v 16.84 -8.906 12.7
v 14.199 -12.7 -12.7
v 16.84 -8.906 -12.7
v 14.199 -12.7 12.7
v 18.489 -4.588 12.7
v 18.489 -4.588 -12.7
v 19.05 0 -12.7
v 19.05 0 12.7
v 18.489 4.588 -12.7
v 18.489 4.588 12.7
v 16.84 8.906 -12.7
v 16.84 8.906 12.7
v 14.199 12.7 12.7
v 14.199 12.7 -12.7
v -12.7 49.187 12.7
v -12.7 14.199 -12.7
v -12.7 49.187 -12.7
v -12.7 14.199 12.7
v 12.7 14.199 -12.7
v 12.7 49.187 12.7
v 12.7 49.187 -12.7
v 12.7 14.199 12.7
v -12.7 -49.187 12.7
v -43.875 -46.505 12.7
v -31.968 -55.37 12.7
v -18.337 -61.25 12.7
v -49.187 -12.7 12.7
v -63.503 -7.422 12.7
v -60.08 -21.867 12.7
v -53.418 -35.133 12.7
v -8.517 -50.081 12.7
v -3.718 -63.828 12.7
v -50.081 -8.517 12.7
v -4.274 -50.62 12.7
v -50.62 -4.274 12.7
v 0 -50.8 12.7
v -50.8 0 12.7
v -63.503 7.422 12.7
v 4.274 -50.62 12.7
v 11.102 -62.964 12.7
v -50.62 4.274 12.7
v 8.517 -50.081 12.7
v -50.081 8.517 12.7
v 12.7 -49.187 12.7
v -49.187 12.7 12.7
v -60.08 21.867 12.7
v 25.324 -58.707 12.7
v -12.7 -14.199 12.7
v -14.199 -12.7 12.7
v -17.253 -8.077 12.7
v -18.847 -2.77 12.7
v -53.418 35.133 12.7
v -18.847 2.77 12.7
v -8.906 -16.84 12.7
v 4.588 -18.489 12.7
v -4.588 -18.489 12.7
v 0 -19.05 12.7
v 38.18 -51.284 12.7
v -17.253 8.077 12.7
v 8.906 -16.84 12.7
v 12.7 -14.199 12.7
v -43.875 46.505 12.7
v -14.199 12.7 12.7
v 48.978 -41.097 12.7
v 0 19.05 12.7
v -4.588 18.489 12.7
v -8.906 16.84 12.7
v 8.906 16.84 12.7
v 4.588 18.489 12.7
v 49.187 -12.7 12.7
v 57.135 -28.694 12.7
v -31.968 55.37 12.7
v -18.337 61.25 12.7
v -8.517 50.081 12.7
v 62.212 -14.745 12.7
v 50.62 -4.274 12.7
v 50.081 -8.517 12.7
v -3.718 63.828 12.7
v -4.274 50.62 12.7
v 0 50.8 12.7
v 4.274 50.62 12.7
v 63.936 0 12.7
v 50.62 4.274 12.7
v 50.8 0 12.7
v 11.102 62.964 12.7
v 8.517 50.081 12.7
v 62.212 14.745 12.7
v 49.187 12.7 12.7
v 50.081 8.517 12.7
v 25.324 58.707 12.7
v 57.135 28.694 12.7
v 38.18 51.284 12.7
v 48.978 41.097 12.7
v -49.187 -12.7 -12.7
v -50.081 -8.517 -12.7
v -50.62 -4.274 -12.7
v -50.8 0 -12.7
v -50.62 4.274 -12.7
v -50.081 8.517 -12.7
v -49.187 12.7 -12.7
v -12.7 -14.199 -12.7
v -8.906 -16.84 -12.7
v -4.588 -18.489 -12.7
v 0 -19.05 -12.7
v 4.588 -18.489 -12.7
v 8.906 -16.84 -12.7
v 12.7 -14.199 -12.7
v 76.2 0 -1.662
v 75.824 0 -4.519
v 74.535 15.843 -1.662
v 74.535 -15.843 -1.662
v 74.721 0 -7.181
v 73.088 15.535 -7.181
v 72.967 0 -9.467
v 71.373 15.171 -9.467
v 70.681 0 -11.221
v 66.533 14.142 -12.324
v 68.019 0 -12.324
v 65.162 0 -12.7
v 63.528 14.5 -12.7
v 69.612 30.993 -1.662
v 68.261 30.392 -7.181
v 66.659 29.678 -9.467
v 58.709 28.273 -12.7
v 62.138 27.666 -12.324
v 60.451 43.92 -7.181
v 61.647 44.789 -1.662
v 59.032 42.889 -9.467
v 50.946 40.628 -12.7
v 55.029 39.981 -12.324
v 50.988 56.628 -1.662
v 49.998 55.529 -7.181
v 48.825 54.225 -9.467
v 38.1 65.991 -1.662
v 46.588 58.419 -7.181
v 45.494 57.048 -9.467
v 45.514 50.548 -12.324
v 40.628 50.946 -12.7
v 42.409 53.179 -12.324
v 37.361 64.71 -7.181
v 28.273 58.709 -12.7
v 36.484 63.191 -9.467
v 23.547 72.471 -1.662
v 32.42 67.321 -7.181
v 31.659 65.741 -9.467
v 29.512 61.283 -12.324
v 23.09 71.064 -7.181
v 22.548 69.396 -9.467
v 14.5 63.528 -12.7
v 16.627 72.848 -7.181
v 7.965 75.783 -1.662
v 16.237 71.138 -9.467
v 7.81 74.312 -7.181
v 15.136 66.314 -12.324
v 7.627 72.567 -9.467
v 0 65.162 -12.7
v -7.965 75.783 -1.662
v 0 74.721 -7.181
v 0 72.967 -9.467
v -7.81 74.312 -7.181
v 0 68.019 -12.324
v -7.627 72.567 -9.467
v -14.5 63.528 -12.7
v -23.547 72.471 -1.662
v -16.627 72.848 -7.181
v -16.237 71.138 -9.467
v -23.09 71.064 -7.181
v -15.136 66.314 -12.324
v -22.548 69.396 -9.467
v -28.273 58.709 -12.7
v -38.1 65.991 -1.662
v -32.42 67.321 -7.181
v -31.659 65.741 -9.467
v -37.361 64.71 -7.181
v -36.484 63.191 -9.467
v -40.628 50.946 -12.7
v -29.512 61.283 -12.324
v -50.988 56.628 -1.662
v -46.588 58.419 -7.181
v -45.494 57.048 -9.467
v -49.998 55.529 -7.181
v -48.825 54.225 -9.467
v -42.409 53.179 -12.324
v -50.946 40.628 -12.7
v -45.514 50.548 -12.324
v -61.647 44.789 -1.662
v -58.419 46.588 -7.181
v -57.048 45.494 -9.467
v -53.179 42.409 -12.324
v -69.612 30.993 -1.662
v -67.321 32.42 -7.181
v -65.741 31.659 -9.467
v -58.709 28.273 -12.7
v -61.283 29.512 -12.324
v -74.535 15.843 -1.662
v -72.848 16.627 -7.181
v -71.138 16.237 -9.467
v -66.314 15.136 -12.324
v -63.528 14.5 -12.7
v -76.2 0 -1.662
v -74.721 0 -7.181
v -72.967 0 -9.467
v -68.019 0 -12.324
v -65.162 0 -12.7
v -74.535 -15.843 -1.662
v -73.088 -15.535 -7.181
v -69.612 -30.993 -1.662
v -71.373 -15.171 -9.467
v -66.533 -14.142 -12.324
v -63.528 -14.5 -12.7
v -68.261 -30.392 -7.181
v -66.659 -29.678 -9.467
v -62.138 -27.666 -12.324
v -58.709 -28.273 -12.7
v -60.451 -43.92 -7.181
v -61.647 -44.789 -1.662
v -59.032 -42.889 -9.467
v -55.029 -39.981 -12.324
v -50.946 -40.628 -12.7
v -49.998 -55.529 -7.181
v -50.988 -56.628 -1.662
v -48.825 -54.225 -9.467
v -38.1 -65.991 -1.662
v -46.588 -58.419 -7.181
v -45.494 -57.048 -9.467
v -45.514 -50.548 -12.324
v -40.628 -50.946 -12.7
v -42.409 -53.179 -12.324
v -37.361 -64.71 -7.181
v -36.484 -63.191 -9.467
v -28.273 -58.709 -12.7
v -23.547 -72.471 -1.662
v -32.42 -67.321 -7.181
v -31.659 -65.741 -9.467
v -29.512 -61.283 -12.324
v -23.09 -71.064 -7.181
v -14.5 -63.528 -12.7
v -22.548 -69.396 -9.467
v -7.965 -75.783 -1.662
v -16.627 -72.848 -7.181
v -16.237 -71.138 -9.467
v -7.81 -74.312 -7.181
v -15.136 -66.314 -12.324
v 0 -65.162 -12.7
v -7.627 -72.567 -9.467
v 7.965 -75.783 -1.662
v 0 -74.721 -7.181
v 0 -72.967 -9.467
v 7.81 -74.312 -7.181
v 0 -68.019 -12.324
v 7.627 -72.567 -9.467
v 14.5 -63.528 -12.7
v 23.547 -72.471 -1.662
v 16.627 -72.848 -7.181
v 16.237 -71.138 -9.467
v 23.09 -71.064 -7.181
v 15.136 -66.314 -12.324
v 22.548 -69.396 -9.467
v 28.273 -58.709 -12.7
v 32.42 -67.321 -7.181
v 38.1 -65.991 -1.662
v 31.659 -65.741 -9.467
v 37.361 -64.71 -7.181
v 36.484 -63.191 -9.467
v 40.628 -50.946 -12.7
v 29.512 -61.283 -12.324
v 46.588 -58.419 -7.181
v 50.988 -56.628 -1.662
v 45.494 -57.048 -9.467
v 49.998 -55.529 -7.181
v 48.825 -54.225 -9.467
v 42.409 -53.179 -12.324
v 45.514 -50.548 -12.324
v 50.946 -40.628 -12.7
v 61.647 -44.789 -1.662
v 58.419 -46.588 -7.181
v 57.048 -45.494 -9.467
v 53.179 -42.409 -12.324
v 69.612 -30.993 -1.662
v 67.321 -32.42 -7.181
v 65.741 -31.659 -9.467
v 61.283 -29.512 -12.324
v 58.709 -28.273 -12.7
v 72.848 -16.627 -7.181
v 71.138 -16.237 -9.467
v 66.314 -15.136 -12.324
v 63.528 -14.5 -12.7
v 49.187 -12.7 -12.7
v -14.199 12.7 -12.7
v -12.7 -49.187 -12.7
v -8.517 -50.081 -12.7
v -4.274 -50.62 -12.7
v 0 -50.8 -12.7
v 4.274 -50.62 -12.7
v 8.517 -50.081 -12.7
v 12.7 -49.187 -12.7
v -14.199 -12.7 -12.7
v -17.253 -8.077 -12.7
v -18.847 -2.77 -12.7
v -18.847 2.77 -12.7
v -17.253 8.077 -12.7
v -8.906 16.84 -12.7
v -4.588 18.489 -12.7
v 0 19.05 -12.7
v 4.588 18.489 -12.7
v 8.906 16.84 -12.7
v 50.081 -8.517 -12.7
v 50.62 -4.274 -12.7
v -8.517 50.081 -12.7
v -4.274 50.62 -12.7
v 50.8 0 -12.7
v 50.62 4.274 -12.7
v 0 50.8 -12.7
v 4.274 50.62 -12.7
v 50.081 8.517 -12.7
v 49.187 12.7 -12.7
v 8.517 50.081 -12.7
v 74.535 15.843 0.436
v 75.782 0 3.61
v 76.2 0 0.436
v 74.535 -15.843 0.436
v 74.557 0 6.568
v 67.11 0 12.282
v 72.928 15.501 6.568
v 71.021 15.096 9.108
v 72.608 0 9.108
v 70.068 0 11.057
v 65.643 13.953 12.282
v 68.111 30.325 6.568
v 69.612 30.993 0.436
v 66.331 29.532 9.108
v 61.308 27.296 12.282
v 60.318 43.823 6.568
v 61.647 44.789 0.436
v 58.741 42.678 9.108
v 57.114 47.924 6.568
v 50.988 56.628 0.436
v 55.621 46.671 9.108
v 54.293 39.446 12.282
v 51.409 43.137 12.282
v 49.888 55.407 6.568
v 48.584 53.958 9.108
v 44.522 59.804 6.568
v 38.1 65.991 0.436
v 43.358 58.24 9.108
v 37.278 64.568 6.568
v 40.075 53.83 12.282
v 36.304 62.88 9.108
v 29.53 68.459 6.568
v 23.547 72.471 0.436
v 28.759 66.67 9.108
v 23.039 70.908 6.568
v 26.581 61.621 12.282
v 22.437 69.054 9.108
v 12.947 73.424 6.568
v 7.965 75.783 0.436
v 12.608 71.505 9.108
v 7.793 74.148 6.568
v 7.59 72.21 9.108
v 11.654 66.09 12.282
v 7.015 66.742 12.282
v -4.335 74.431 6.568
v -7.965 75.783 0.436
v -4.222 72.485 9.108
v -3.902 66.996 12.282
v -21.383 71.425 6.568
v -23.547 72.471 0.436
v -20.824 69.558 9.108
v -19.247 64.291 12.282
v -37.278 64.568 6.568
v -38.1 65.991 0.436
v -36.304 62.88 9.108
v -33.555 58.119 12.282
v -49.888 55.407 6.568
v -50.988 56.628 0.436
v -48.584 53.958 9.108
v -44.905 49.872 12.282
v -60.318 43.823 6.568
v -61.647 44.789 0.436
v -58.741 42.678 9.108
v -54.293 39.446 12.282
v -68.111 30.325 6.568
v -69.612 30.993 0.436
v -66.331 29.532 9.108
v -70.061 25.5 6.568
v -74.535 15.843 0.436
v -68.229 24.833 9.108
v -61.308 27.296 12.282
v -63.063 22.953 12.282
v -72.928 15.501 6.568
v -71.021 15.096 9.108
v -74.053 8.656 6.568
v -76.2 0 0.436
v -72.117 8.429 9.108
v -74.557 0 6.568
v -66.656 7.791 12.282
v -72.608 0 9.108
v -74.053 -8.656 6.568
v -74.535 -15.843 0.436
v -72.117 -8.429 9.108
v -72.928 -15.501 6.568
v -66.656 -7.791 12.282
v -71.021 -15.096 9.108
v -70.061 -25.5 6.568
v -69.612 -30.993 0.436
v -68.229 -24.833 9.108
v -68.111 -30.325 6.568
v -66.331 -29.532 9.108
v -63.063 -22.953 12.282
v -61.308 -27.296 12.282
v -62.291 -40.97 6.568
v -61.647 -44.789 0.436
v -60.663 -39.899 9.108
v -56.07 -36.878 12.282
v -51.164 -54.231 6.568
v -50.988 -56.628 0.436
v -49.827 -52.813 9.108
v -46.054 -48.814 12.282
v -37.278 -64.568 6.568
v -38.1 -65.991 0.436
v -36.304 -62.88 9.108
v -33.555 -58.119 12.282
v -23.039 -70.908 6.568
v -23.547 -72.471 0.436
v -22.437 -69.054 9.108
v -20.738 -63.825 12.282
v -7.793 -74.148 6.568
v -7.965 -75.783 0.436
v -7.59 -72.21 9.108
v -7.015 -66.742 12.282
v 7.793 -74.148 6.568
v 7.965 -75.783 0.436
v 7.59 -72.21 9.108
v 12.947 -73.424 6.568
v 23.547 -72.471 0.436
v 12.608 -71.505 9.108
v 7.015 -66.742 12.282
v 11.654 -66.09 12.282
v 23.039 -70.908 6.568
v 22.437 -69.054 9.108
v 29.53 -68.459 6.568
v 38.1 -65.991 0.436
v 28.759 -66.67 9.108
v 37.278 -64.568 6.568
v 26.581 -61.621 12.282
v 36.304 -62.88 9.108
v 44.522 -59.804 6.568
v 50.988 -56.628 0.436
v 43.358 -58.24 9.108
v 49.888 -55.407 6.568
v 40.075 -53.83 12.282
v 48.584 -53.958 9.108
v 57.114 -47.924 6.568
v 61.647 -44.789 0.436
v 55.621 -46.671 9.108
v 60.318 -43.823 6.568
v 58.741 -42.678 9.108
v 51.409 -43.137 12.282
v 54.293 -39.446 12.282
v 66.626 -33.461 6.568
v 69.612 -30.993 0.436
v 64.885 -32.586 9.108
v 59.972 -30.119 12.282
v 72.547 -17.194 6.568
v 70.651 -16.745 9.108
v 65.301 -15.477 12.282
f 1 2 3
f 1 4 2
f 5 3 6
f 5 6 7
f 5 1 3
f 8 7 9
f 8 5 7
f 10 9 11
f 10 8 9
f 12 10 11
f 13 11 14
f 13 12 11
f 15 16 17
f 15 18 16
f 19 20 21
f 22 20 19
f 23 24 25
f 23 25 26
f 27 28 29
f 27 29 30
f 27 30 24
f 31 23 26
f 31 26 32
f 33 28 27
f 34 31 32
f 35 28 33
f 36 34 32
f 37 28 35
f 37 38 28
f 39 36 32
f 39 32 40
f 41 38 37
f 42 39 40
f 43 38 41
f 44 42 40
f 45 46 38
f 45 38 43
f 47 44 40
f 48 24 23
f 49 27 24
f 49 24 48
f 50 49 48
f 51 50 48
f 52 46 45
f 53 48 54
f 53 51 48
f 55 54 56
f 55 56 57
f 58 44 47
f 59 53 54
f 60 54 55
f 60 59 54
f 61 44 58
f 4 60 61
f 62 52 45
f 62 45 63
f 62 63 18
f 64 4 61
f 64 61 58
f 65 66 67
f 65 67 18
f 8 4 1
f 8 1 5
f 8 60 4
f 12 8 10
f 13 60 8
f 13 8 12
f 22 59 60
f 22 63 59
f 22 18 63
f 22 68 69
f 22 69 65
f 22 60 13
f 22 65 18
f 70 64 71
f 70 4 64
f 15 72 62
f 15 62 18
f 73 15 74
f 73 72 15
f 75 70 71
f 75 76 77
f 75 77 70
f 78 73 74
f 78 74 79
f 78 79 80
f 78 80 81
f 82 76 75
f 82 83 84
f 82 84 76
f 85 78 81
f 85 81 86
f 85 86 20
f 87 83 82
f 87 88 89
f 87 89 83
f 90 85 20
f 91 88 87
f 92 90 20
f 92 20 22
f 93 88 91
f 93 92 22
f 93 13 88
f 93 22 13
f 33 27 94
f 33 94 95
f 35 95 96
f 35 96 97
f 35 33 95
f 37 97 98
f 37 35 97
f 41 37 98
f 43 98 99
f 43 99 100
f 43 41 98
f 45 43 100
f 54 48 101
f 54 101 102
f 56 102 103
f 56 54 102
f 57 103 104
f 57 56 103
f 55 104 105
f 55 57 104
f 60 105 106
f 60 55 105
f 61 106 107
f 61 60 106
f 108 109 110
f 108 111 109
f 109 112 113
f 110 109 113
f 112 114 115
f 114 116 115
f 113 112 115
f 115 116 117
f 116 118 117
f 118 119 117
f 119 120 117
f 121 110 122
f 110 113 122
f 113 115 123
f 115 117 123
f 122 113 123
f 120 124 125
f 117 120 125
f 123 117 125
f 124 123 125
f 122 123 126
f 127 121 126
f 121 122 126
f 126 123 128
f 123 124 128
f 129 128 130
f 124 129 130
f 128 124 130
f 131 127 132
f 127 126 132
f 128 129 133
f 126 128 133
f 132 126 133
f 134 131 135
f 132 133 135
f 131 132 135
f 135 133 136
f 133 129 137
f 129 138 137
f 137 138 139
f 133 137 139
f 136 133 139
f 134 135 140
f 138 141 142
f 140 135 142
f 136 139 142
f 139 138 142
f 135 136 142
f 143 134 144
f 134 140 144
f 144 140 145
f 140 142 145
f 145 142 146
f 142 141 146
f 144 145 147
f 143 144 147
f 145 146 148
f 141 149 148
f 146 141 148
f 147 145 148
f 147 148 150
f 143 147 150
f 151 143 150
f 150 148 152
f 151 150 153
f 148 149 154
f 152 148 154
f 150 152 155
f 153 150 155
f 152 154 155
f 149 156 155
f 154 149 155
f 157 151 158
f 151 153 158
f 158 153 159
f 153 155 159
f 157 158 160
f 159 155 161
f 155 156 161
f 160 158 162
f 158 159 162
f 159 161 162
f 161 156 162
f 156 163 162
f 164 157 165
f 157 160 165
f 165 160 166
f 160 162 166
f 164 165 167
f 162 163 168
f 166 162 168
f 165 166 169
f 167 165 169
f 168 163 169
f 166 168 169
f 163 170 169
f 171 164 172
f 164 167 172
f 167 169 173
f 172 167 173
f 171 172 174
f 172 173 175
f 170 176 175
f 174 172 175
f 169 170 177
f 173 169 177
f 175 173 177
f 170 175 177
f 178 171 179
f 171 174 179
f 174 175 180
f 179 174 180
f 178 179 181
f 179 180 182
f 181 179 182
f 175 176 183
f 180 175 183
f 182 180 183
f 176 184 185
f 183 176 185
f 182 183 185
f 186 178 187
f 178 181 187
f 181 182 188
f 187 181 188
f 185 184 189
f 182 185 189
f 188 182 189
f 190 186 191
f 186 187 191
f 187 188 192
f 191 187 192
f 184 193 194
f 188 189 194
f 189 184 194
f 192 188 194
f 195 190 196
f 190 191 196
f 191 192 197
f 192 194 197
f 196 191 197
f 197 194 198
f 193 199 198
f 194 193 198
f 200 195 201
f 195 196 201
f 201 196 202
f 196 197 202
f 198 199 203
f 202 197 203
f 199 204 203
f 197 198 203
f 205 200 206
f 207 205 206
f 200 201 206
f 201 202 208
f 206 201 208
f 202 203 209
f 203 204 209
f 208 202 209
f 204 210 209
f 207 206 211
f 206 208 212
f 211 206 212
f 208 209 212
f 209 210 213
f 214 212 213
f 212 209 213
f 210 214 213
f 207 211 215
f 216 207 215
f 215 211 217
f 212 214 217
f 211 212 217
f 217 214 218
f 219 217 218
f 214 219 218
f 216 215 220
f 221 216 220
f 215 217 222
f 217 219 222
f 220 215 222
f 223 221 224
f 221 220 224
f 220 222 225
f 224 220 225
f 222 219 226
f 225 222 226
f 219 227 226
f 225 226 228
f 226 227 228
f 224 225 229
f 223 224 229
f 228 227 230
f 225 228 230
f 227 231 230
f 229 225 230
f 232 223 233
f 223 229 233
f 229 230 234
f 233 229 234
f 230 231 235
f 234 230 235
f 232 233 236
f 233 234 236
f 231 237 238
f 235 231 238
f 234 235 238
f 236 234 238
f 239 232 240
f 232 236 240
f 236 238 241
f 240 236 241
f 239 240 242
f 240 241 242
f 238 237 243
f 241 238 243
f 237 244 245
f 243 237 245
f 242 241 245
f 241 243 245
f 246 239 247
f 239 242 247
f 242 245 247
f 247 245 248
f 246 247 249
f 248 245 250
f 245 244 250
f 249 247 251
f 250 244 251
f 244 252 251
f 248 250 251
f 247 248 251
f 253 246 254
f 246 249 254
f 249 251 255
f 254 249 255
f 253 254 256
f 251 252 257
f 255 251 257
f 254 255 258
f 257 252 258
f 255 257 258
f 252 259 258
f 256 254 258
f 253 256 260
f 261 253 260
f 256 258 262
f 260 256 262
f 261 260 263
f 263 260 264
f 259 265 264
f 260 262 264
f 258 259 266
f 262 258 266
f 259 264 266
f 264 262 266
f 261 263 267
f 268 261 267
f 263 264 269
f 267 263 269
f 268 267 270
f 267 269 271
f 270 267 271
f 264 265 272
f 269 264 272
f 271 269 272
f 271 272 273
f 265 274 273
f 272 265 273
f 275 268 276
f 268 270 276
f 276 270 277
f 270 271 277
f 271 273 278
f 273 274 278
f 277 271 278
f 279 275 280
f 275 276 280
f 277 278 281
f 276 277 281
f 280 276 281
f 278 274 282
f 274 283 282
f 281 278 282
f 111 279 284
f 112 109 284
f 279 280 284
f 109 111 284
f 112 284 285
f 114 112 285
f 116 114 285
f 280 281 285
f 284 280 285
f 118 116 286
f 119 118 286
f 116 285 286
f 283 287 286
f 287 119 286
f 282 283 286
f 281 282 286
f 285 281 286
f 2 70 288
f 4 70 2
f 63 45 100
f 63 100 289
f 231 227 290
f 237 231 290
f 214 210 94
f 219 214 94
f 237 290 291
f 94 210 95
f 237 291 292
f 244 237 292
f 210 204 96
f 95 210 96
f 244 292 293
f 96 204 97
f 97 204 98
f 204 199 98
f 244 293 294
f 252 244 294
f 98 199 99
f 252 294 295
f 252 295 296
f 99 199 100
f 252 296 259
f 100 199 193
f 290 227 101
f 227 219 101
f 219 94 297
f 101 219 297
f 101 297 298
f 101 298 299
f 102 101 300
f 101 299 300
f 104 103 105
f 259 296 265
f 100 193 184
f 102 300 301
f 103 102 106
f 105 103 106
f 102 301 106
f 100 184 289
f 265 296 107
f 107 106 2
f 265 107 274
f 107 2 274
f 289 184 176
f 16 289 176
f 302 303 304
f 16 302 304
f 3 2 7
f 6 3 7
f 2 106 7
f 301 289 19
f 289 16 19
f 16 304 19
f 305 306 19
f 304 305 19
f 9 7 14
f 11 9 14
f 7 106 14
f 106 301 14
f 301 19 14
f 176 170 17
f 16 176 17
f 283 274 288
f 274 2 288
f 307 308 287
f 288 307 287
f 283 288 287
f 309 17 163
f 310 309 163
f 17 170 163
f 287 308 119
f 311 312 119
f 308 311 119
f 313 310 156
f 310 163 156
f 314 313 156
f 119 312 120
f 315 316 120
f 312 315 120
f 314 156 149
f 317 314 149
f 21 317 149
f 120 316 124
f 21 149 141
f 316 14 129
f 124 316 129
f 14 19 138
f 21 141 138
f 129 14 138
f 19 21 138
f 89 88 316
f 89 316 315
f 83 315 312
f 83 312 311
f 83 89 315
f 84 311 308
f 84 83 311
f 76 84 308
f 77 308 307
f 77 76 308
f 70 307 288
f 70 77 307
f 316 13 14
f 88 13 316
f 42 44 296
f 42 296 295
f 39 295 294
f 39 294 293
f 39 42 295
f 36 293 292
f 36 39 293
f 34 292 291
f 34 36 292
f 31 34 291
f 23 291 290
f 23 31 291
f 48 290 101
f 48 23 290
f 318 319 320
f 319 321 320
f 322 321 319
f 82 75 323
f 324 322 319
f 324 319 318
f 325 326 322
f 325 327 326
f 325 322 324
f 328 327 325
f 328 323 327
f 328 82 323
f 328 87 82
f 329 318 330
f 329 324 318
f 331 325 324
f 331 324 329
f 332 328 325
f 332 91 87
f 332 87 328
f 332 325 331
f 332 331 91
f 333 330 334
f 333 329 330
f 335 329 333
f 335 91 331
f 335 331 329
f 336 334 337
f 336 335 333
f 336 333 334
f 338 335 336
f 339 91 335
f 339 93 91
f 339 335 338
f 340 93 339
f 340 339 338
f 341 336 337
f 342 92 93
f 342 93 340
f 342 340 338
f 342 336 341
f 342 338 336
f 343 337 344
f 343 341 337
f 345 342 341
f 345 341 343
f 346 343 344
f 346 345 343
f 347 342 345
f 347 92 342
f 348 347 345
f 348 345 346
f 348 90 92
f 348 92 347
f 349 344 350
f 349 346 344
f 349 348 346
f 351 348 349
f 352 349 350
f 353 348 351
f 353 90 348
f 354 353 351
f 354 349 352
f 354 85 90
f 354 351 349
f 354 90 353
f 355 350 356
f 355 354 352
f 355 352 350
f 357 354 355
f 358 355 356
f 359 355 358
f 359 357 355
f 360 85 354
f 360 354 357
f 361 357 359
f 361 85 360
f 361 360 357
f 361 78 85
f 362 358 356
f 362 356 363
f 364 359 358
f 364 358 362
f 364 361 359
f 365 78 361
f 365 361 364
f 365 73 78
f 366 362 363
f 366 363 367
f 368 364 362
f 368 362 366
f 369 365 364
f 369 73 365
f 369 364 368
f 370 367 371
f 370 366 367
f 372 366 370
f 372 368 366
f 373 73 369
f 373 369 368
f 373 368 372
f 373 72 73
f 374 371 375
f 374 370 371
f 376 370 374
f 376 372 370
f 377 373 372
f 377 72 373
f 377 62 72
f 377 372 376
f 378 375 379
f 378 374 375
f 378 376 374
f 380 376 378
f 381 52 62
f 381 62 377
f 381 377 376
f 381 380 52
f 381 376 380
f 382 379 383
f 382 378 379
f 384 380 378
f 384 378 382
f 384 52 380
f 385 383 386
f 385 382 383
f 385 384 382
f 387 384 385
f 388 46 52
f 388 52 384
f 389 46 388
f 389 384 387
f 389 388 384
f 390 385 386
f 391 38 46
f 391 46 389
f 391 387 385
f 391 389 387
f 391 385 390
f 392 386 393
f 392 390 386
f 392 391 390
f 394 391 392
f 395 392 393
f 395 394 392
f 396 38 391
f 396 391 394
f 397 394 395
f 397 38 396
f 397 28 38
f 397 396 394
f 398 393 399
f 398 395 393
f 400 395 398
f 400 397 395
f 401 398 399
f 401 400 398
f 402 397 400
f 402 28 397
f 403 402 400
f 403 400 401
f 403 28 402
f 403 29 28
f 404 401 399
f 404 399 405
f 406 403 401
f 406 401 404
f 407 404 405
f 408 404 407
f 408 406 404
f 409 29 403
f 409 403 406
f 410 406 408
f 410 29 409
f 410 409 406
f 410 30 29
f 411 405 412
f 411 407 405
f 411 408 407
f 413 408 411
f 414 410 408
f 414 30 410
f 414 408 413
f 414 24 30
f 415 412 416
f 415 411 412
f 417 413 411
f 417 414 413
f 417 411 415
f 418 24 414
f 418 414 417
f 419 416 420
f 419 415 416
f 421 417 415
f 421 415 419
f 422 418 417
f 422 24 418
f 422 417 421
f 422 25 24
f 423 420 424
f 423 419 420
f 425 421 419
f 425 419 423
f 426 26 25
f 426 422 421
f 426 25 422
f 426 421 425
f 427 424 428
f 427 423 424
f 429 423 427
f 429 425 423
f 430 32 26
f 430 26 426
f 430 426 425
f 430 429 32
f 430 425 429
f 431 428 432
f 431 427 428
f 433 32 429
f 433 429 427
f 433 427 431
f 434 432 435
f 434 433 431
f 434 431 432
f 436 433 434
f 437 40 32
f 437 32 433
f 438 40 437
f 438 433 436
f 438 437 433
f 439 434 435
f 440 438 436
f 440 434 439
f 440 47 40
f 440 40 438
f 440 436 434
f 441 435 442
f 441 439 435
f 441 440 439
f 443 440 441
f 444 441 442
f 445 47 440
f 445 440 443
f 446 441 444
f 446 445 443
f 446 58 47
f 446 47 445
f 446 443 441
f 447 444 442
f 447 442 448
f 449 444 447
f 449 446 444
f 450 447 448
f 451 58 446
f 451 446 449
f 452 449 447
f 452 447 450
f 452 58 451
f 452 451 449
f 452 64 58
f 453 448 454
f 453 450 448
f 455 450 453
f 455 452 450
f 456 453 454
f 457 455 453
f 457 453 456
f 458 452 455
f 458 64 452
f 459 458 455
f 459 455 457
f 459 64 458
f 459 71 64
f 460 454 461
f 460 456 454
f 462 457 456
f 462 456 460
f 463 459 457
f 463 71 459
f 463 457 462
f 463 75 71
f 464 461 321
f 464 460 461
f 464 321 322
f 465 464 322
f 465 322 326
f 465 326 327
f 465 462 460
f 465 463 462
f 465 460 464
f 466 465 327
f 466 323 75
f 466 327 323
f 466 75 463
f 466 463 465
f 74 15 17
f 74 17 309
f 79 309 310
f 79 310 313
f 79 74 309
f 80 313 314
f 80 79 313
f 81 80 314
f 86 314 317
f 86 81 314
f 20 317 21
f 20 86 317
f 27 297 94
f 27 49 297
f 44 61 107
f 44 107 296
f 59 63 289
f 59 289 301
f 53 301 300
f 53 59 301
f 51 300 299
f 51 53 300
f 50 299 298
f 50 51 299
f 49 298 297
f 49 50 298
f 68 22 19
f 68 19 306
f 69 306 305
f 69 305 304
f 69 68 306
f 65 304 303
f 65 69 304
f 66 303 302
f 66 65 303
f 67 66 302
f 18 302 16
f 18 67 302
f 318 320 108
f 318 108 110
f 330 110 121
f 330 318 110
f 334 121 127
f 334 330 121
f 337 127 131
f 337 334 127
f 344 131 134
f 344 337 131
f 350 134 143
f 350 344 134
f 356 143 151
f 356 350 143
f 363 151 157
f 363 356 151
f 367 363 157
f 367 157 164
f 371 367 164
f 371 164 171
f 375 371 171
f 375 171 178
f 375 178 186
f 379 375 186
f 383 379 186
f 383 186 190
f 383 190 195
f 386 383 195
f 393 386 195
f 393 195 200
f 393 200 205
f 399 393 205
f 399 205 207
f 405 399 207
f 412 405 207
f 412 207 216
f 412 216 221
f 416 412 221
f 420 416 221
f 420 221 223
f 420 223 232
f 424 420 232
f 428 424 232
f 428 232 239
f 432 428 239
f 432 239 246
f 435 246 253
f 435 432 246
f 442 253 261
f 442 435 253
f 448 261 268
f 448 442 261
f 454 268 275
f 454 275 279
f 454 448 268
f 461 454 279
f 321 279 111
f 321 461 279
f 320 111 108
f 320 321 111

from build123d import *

# Parameters (mm, degrees)
F0_R     = 76.2
F1_DEPTH = 12.7
F2_R     = 12.2642048969
F3_R     = 11.0377844072


# Not quite as in the source:
# - ends of sketch curves that miss each other by under 0.0002 mm in the source are joined
# - a feature names something its author has since deleted; it is built from what else it names


with BuildPart() as f1:
    # F0 (on Top) → F1 (new body, symmetric)
    with BuildSketch(Plane.XY):
        Circle(F0_R)
        with BuildLine():
            ThreePointArc((49.1868885365, 12.6999998465), (50.3951085804, 6.4010179795), (50.8, 0))
            ThreePointArc((50.8, 0), (50.3951085804, -6.4010179795), (49.1868885365, -12.6999998465))
            ThreePointArc((49.1868885365, -12.6999998465), (35.9210245403, -35.9210244282), (12.7, -49.1868884968))
            ThreePointArc((12.7, -49.1868884968), (6.4010180581, -50.3951085704), (0, -50.8))
            ThreePointArc((0, -50.8), (-6.4010180581, -50.3951085704), (-12.7, -49.1868884968))
            ThreePointArc((-12.7, -49.1868884968), (-35.9210245403, -35.9210244282), (-49.1868885365, -12.6999998465))
            ThreePointArc((-49.1868885365, -12.6999998465), (-50.3951085804, -6.4010179795), (-50.8, 0))
            ThreePointArc((-50.8, 0), (-50.3951085704, 6.4010180581), (-49.1868884968, 12.7))
            ThreePointArc((-49.1868884968, 12.7), (-35.9210244282, 35.9210245403), (-12.6999998465, 49.1868885365))
            ThreePointArc((-12.6999998465, 49.1868885365), (-6.4010179795, 50.3951085804), (0, 50.8))
            ThreePointArc((0, 50.8), (6.4010179795, 50.3951085804), (12.6999998465, 49.1868885365))
            ThreePointArc((12.6999998465, 49.1868885365), (35.9210244843, 35.9210244843), (49.1868885365, 12.6999998465))
        make_face(mode=Mode.SUBTRACT)
        with BuildLine():
            ThreePointArc((12.7, -49.1868884968), (35.9210245403, -35.9210244282), (49.1868885365, -12.6999998465))
            Line((49.1868885365, -12.6999998465), (14.1990317944, -12.6999998465))
            Line((14.1990317944, -12.6999998465), (12.7, -12.6999998465))
            Line((12.7, -12.6999998465), (12.7, -14.1990316571))
            Line((12.7, -14.1990316571), (12.7, -49.1868884968))
        make_face()
        with BuildLine():
            ThreePointArc((-49.1868885365, -12.6999998465), (-35.9210245403, -35.9210244282), (-12.7, -49.1868884968))
            Line((-12.7, -49.1868884968), (-12.7, -14.1990316571))
            Line((-12.7, -14.1990316571), (-12.7, -12.6999998465))
            Line((-12.7, -12.6999998465), (-14.1990317944, -12.6999998465))
            Line((-14.1990317944, -12.6999998465), (-49.1868885365, -12.6999998465))
        make_face()
        with BuildLine():
            Line((-12.6999998465, 14.1990317944), (-12.6999998465, 49.1868885365))
            ThreePointArc((-12.6999998465, 49.1868885365), (-35.9210244282, 35.9210245403), (-49.1868884968, 12.7))
            Line((-49.1868884968, 12.7), (-14.1990316571, 12.7))
            Line((-14.1990316571, 12.7), (-12.6999998465, 12.7))
            Line((-12.6999998465, 12.7), (-12.6999998465, 14.1990317944))
        make_face()
        with BuildLine():
            Line((14.1990317944, 12.6999998465), (49.1868885365, 12.6999998465))
            ThreePointArc((49.1868885365, 12.6999998465), (35.9210244843, 35.9210244843), (12.6999998465, 49.1868885365))
            Line((12.6999998465, 49.1868885365), (12.6999998465, 14.1990317944))
            Line((12.6999998465, 14.1990317944), (12.6999998465, 12.6999998465))
            Line((12.6999998465, 12.6999998465), (14.1990317944, 12.6999998465))
        make_face()
        Polygon((12.7, -12.6999998465), (12.7, 0), (12.6999998465, 12.6999998465), (0, 12.6999998465), (-12.6999998465, 12.7), (-12.7, 0), (-12.7, -12.6999998465), (0, -12.6999998465), align=None)
        with BuildLine():
            Line((-12.7, 0), (-12.6999998465, 12.7))
            Line((-12.6999998465, 12.7), (-14.1990316571, 12.7))
            ThreePointArc((-14.1990316571, 12.7), (-17.7959834382, 6.7974608102), (-19.05, 0))
            Line((-19.05, 0), (-12.7, 0))
        make_face()
        with BuildLine():
            ThreePointArc((14.1990317944, -12.6999998465), (17.795983475, -6.797460714), (19.05, 0))
            Line((19.05, 0), (12.7, 0))
            Line((12.7, 0), (12.7, -12.6999998465))
            Line((12.7, -12.6999998465), (14.1990317944, -12.6999998465))
        make_face()
        with BuildLine():
            Line((12.7, 0), (19.05, 0))
            ThreePointArc((19.05, 0), (17.795983475, 6.797460714), (14.1990317944, 12.6999998465))
            Line((14.1990317944, 12.6999998465), (12.6999998465, 12.6999998465))
            Line((12.6999998465, 12.6999998465), (12.7, 0))
        make_face()
        with BuildLine():
            ThreePointArc((0, -19.05), (6.7974608102, -17.7959834382), (12.7, -14.1990316571))
            Line((12.7, -14.1990316571), (12.7, -12.6999998465))
            Line((12.7, -12.6999998465), (0, -12.6999998465))
            Line((0, -12.6999998465), (0, -19.05))
        make_face()
        with BuildLine():
            ThreePointArc((-12.7, -14.1990316571), (-6.7974608102, -17.7959834382), (0, -19.05))
            Line((0, -19.05), (0, -12.6999998465))
            Line((0, -12.6999998465), (-12.7, -12.6999998465))
            Line((-12.7, -12.6999998465), (-12.7, -14.1990316571))
        make_face()
        with BuildLine():
            Line((-14.1990317944, -12.6999998465), (-12.7, -12.6999998465))
            Line((-12.7, -12.6999998465), (-12.7, 0))
            Line((-12.7, 0), (-19.05, 0))
            ThreePointArc((-19.05, 0), (-17.795983475, -6.797460714), (-14.1990317944, -12.6999998465))
        make_face()
        with BuildLine():
            Line((0, 12.6999998465), (0, 19.05))
            ThreePointArc((0, 19.05), (-6.797460714, 17.795983475), (-12.6999998465, 14.1990317944))
            Line((-12.6999998465, 14.1990317944), (-12.6999998465, 12.7))
            Line((-12.6999998465, 12.7), (0, 12.6999998465))
        make_face()
        with BuildLine():
            Line((12.6999998465, 12.6999998465), (12.6999998465, 14.1990317944))
            ThreePointArc((12.6999998465, 14.1990317944), (6.797460714, 17.795983475), (0, 19.05))
            Line((0, 19.05), (0, 12.6999998465))
            Line((0, 12.6999998465), (12.6999998465, 12.6999998465))
        make_face()
    extrude(amount=F1_DEPTH, both=True)

    # F2
    f2_edges = [f1.edges().sort_by_distance(p)[0] for p in [
        (-76.2, 0, 12.7),
    ]]
    fillet(f2_edges, radius=F2_R)

    # F3
    f3_edges = [f1.edges().sort_by_distance(p)[0] for p in [
        (-76.2, 0, -12.7),
    ]]
    fillet(f3_edges, radius=F3_R)


solid = f1.part
